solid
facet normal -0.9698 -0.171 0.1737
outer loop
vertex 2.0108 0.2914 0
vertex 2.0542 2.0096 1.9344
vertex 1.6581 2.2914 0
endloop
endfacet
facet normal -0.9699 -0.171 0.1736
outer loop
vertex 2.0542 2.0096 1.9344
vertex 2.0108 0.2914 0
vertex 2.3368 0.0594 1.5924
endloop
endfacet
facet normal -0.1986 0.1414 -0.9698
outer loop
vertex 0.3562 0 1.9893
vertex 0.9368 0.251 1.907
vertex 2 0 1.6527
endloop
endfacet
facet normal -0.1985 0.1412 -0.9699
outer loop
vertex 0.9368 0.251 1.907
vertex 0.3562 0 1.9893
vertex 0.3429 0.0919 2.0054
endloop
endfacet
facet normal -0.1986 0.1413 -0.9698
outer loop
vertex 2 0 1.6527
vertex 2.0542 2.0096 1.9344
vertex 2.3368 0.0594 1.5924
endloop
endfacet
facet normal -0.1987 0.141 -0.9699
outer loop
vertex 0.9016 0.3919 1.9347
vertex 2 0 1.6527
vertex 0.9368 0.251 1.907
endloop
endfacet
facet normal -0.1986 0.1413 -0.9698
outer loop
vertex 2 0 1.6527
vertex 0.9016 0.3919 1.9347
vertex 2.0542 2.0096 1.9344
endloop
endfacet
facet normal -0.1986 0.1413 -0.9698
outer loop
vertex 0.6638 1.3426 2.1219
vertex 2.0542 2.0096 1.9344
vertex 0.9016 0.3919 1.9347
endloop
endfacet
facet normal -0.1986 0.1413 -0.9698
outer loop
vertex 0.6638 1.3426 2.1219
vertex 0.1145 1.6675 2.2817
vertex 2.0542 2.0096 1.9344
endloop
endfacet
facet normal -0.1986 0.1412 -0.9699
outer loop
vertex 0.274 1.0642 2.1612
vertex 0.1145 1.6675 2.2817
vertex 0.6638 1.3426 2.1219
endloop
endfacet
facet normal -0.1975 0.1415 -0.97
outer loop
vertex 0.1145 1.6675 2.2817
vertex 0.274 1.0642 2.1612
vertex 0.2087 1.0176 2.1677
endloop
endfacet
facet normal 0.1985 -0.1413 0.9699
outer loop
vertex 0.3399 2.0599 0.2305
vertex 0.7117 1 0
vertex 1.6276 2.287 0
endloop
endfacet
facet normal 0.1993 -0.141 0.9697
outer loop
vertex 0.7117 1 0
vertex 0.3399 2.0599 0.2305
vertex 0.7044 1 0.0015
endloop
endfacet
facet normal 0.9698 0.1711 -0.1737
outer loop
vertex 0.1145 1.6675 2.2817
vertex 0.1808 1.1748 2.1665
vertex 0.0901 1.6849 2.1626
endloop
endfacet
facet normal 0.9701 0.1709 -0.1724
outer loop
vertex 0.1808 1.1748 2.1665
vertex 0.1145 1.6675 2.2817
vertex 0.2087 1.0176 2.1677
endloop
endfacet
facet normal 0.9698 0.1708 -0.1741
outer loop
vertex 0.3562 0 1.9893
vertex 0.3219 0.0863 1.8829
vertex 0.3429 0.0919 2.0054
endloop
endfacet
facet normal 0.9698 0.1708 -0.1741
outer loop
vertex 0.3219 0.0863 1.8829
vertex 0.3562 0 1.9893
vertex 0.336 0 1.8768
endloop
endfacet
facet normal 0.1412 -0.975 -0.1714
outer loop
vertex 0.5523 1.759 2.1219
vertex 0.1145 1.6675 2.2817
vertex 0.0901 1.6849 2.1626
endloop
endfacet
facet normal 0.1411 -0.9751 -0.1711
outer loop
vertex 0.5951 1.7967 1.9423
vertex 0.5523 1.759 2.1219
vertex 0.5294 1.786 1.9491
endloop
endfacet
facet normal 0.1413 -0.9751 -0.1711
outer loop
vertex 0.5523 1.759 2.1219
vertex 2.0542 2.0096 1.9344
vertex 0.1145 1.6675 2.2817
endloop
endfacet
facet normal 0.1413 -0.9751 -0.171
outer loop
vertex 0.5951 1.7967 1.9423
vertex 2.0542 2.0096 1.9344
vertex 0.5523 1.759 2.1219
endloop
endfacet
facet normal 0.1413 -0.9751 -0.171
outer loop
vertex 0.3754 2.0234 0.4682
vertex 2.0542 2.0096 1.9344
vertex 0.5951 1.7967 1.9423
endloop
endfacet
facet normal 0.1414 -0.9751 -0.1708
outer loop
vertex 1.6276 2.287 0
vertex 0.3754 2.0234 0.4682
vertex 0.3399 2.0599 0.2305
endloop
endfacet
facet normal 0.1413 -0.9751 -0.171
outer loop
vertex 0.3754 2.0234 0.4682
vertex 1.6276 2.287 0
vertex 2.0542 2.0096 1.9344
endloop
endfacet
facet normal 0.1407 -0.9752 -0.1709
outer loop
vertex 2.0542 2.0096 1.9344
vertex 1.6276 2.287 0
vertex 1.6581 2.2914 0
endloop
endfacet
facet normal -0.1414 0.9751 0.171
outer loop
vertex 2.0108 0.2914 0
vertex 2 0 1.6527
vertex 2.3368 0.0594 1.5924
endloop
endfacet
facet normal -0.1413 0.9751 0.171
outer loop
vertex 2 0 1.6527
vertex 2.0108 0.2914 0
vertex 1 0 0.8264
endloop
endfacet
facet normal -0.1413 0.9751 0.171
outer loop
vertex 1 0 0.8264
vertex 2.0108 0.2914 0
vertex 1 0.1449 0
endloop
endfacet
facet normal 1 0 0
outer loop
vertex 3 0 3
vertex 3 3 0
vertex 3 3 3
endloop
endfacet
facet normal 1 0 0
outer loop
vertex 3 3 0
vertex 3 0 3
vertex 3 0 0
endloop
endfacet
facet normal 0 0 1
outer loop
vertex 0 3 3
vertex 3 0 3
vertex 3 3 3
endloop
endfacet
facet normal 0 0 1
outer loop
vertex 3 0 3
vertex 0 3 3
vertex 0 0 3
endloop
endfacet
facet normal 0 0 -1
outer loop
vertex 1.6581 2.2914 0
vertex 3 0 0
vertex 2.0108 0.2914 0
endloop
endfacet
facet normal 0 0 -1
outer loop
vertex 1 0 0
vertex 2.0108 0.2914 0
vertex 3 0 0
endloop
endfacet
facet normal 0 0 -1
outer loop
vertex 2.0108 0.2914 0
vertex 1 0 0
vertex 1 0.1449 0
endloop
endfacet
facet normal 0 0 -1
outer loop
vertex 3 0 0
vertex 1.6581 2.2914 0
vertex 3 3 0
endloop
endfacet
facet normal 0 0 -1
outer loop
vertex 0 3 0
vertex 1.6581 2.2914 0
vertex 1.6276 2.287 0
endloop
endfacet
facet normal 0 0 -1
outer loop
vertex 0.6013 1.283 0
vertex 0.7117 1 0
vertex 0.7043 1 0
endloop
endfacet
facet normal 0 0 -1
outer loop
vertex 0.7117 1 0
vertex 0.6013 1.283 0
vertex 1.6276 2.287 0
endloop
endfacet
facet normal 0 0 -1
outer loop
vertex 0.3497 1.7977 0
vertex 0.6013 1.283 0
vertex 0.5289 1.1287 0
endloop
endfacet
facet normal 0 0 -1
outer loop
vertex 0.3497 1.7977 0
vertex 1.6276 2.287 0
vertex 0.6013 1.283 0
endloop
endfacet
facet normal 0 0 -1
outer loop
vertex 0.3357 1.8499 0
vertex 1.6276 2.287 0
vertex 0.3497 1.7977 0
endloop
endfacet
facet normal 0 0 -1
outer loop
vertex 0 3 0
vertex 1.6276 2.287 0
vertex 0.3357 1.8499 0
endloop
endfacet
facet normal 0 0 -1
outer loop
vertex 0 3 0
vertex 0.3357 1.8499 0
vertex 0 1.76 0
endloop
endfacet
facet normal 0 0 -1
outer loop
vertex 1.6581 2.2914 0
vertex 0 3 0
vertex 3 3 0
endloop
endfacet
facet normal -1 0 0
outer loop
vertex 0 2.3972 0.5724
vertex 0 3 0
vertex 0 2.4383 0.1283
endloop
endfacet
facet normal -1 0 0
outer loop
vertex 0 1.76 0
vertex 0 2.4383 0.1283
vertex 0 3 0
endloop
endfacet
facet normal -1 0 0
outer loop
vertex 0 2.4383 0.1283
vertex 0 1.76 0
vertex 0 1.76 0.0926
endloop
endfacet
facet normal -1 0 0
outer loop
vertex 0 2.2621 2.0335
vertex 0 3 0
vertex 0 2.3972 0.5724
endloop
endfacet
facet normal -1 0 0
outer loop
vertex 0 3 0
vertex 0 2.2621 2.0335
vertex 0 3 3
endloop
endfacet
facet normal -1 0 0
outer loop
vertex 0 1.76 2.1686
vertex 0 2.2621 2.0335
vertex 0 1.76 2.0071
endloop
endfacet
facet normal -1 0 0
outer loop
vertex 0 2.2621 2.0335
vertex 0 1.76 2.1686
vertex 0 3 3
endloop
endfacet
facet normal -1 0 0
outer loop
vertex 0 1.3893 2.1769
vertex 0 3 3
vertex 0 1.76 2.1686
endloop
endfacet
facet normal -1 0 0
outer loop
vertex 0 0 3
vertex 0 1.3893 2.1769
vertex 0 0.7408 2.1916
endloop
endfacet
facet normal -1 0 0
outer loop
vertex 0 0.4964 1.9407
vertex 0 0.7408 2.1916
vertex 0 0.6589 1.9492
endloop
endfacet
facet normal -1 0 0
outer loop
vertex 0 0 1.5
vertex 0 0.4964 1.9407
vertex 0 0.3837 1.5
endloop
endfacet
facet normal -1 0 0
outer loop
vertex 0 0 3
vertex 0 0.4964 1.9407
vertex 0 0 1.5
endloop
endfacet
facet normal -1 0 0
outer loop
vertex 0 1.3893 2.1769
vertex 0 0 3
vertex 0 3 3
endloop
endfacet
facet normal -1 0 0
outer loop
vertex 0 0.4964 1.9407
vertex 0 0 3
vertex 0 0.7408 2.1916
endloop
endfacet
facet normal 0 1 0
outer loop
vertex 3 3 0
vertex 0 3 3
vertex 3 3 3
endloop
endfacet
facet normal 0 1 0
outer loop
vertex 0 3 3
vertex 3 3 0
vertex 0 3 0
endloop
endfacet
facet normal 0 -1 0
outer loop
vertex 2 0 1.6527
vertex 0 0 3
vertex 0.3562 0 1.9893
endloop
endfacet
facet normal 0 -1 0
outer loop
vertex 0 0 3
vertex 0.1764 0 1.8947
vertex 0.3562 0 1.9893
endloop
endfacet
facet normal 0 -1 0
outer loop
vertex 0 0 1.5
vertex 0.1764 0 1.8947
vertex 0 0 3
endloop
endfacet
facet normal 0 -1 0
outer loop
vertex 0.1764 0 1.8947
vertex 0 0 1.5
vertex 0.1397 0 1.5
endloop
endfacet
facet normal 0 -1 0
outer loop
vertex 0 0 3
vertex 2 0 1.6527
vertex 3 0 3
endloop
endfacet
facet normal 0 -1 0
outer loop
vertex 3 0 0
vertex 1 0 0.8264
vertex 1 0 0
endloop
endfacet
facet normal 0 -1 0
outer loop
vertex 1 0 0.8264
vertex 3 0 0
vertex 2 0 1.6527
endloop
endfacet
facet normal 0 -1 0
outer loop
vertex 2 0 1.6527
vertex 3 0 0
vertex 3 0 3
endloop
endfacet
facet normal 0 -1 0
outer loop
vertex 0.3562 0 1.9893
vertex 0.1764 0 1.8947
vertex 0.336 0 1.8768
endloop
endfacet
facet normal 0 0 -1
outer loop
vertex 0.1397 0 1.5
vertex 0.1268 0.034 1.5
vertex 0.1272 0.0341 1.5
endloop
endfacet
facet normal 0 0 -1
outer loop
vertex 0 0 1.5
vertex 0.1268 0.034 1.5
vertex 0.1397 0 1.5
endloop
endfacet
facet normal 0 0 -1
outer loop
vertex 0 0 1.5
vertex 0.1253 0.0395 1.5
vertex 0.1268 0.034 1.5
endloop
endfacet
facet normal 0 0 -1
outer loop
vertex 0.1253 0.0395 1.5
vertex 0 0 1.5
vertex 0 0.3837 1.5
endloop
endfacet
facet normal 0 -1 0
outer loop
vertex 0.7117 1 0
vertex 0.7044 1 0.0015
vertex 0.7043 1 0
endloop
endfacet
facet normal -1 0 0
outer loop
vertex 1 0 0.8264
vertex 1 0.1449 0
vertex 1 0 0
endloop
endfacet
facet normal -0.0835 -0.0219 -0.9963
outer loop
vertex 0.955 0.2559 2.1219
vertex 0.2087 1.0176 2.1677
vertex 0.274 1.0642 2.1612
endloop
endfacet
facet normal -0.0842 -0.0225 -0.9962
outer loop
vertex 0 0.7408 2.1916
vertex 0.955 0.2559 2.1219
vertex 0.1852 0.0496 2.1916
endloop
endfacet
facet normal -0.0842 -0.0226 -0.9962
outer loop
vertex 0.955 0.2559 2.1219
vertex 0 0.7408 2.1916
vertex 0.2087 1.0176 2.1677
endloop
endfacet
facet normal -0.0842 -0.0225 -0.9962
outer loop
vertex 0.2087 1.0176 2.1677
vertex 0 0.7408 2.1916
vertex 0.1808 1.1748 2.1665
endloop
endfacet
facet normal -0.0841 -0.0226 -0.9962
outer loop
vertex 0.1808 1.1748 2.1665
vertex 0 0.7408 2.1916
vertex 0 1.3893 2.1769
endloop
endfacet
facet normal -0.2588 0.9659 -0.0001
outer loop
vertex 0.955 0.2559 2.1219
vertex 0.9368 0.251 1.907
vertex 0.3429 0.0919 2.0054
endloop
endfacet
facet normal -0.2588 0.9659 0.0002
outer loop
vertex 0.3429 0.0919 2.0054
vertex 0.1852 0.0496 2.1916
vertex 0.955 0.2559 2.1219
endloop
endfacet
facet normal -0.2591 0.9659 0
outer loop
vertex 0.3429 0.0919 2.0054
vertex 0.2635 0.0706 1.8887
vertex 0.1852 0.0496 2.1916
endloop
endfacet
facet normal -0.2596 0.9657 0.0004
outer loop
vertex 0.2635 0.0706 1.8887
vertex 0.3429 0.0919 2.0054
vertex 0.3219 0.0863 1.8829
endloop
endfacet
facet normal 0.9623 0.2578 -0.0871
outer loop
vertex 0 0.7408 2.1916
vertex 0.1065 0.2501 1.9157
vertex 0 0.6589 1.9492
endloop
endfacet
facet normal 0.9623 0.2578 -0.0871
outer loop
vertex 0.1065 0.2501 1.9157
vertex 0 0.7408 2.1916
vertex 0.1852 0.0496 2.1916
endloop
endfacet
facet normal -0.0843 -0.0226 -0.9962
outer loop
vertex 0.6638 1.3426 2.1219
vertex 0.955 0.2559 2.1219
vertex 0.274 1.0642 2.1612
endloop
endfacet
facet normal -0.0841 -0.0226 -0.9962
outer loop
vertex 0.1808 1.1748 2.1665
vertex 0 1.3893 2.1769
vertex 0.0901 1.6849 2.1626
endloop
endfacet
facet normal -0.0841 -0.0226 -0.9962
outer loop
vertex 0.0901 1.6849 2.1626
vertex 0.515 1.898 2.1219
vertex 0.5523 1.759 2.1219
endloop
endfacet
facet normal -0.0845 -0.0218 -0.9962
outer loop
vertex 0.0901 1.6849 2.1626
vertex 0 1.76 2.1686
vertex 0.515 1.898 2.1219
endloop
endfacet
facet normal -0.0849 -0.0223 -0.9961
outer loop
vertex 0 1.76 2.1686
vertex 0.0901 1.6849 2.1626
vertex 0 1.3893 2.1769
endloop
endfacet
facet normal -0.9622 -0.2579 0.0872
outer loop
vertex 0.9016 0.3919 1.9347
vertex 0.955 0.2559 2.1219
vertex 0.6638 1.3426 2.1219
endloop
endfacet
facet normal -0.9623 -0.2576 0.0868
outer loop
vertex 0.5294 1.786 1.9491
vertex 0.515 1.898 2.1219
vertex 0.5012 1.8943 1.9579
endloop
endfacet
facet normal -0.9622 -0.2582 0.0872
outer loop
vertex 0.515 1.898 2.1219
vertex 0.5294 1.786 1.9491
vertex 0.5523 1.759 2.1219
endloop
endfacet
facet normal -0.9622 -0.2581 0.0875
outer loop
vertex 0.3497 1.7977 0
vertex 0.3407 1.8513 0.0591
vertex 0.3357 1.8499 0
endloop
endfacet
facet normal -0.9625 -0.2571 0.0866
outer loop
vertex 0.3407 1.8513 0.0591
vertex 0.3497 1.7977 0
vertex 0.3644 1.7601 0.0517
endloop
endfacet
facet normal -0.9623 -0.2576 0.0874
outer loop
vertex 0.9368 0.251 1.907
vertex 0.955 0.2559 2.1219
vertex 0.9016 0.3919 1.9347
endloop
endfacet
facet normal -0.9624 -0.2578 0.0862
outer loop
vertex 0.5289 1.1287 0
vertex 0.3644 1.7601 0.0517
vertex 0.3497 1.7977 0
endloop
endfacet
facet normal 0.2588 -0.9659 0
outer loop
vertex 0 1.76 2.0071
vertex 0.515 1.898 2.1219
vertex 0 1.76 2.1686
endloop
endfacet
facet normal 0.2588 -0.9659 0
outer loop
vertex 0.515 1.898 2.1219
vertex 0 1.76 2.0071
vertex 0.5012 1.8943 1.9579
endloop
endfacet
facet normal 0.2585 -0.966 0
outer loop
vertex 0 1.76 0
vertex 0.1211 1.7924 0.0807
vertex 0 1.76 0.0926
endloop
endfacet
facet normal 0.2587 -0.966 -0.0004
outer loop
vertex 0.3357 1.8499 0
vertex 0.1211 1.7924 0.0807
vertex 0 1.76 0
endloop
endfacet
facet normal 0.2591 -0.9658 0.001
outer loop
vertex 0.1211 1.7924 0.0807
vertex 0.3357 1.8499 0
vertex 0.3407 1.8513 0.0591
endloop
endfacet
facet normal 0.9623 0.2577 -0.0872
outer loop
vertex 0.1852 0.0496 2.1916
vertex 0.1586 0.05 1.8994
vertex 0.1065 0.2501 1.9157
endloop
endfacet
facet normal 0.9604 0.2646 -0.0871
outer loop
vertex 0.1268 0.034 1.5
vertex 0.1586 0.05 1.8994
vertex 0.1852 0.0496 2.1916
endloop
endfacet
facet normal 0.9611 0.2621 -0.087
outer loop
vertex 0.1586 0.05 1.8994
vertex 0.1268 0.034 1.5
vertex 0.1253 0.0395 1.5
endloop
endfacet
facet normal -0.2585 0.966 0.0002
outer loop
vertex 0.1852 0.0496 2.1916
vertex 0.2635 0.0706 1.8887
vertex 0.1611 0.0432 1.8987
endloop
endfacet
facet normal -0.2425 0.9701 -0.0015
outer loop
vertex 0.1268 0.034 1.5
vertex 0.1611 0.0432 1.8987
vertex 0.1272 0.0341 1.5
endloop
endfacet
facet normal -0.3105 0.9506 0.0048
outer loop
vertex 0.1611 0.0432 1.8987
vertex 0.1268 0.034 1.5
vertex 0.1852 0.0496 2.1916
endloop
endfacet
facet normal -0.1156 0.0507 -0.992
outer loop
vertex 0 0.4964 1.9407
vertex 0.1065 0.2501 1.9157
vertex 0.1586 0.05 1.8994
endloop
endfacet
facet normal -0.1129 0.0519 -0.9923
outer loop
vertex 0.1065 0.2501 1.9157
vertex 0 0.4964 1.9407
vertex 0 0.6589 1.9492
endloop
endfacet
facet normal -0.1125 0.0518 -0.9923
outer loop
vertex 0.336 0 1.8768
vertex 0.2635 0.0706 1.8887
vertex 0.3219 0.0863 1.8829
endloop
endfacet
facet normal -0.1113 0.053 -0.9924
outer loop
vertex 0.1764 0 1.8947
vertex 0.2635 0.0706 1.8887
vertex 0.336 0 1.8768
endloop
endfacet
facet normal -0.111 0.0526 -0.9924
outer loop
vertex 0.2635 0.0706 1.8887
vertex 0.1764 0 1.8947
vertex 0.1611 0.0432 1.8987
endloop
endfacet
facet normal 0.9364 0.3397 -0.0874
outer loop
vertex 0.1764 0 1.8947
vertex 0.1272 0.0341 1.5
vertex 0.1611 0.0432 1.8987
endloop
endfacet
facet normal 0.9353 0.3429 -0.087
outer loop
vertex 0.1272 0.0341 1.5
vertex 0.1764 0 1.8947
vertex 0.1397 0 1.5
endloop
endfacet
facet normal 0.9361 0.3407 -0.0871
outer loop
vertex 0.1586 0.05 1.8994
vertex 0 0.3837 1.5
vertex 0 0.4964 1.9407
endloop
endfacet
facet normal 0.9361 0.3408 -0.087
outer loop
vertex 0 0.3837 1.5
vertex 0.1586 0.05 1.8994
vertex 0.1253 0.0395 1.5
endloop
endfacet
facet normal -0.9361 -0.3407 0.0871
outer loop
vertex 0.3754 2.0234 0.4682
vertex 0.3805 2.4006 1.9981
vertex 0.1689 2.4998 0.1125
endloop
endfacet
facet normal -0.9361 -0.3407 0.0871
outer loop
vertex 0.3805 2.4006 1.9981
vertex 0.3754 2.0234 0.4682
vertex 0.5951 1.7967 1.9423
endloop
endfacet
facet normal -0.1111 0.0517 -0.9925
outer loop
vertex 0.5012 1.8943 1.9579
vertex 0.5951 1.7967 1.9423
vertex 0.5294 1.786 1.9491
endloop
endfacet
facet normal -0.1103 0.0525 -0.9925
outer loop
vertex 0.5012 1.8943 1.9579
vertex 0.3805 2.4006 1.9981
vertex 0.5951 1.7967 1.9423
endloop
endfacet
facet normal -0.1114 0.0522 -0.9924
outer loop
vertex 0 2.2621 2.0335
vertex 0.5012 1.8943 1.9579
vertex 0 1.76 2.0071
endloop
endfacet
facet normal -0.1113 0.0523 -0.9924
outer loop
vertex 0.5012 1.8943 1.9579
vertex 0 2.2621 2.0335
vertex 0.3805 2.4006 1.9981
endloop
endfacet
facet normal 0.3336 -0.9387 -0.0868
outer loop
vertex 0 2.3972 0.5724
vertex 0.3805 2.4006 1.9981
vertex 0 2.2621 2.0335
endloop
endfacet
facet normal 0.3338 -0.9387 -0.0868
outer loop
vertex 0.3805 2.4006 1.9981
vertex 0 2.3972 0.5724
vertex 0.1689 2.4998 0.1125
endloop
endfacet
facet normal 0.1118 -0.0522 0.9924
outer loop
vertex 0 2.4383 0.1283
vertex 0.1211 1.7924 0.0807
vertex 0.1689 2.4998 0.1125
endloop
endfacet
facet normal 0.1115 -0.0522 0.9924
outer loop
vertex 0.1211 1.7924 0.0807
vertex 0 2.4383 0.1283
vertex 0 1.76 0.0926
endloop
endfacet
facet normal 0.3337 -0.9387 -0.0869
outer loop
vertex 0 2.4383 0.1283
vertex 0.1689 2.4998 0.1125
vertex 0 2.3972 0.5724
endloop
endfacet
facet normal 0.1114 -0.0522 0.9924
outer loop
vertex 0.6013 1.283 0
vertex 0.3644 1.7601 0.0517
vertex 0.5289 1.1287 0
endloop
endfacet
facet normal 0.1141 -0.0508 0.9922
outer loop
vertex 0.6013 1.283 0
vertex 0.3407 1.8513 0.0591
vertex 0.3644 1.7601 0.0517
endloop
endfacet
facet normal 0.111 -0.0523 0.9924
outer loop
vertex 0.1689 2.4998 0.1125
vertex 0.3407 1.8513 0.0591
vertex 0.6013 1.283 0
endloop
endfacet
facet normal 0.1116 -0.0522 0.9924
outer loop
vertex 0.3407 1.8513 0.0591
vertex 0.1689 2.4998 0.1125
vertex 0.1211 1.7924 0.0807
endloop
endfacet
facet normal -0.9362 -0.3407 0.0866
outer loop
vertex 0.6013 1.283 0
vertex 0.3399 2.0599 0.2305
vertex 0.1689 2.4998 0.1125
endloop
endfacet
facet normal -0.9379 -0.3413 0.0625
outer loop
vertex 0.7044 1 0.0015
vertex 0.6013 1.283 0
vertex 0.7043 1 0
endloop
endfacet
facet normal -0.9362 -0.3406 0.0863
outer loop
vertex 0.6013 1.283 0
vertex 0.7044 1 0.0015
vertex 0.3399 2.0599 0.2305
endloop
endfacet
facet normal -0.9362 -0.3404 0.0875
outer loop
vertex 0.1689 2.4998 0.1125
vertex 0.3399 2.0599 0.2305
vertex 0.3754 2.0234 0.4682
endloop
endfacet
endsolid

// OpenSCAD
union(){
	difference(){
cube(size = [3,3,3], center = false);
cube(size = [1,2,3], center = true);

cube(size = [3], center = false);
cube(size = [1,1,1], center = false);
rotate([30,20,40]){
cube(size = [3], center = false);
cube(size = [1,2], center = false);
}
rotate([10,10,10]){
cube(size = [2,2,2], center = false);
cube(size = [1,3], center = false);
}
rotate([0,5,15]){
cube(size = [0.8,1.7,2.2], center = false);
}
rotate([5,5,20]){
cube(size = [1,2.3,1.9], center = false);
}
}
}
